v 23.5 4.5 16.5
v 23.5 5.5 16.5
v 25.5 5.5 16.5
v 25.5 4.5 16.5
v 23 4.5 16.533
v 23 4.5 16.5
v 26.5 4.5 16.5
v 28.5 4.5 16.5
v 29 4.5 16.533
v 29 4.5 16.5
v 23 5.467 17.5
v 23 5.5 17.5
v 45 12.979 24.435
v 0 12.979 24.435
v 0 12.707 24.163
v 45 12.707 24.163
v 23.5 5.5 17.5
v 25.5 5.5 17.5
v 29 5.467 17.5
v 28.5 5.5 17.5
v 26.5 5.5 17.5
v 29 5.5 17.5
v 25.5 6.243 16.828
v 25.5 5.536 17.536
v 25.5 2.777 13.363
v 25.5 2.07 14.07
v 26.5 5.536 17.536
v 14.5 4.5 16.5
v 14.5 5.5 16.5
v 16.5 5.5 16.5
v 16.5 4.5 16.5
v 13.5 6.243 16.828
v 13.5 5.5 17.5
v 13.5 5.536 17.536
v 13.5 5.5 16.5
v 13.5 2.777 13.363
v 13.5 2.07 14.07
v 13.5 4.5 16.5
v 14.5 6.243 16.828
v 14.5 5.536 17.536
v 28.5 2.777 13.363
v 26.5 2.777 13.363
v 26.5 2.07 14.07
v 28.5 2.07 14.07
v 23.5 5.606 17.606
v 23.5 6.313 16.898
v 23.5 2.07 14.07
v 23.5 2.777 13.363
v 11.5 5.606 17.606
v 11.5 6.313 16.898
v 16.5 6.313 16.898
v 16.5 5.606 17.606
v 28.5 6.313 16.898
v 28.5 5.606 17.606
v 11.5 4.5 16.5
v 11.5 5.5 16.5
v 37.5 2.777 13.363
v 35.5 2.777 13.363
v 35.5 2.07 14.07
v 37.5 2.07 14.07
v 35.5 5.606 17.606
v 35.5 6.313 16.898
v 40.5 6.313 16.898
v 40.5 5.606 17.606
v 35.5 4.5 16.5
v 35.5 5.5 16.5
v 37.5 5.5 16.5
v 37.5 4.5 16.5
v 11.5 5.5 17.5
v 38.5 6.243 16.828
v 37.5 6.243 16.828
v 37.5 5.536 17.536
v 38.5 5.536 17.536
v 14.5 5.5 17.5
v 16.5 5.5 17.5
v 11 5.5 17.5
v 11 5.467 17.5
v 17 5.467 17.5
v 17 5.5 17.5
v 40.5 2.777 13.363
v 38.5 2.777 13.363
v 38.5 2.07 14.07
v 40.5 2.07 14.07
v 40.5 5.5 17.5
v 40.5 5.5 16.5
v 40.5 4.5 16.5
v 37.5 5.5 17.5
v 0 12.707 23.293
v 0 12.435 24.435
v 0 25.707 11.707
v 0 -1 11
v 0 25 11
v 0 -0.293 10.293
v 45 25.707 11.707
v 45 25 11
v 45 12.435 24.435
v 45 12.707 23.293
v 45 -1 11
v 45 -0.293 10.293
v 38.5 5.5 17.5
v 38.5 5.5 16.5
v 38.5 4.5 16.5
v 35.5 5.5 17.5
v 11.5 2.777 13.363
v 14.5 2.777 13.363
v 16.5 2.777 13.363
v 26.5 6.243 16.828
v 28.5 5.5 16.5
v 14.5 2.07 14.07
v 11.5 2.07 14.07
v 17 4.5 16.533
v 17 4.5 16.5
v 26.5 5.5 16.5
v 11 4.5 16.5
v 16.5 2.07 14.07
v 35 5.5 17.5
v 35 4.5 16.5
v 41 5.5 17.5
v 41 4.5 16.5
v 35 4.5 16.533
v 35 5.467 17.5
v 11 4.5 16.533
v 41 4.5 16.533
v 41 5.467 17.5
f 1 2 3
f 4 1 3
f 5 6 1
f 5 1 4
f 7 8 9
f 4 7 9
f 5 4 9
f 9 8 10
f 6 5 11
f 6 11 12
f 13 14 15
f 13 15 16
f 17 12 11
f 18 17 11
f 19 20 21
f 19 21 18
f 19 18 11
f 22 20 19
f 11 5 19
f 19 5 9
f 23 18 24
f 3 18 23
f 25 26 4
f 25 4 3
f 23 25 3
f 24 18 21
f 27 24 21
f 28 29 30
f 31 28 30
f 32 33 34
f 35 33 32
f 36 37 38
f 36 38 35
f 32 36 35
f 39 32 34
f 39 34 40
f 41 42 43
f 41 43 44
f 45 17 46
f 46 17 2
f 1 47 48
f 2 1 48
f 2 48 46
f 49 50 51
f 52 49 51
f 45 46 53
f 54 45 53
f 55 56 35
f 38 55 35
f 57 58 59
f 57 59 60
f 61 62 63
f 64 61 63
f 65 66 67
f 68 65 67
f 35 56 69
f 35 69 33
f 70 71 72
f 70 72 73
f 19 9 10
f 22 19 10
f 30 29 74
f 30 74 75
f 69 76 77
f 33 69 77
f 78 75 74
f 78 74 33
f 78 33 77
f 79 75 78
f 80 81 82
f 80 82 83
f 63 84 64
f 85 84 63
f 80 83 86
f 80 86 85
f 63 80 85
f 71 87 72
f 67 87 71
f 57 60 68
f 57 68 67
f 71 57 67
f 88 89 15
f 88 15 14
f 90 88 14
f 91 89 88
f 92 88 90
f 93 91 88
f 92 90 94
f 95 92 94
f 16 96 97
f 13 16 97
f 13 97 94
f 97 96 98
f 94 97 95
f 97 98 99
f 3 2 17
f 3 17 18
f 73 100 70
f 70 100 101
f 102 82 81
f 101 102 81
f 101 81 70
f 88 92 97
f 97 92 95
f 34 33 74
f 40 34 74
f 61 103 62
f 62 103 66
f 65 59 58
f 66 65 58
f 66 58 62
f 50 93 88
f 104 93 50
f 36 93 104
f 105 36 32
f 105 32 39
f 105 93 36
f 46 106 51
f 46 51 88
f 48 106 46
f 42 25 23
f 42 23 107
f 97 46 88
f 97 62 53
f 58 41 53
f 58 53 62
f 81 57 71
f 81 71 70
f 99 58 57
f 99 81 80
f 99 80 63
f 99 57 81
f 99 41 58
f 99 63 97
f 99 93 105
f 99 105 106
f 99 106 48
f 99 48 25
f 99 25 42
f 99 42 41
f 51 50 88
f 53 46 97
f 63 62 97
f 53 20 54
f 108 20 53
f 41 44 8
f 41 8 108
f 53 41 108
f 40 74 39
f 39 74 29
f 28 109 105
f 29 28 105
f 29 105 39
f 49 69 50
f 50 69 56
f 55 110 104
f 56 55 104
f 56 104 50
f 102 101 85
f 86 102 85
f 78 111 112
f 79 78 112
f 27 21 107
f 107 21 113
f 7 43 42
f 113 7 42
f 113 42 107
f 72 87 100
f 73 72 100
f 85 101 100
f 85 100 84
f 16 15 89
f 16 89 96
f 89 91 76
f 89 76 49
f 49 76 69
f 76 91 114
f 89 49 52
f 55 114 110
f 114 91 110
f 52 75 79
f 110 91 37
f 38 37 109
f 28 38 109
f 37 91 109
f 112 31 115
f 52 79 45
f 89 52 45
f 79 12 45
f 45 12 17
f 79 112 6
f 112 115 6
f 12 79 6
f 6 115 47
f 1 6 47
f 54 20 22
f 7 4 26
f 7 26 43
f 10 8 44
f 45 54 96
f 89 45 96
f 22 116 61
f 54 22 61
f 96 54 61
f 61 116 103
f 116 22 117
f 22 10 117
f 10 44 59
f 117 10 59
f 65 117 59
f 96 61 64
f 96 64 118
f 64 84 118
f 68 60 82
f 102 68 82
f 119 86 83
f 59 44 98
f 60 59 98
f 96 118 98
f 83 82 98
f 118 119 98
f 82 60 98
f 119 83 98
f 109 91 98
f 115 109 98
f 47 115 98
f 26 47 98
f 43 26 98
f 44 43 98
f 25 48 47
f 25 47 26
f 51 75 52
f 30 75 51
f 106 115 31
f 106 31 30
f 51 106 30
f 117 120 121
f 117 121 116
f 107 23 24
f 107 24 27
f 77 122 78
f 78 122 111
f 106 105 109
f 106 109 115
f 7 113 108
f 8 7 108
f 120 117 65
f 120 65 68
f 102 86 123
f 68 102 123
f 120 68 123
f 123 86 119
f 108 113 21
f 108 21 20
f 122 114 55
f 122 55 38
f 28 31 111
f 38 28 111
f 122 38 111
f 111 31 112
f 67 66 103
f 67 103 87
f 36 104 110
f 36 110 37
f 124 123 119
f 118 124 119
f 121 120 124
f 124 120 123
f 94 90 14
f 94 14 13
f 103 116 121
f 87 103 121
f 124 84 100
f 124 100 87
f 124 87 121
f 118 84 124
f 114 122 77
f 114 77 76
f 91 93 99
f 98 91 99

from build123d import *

# Parameters (mm, degrees)
BOX139_W               = 12
BOX139_H               = 16
BOX139_DEPTH           = 23
BOX139_PLACEMENT_ANGLE = 45
BOX141_W               = 6
BOX141_H               = 1
BOX141_DEPTH           = 1
BOX140_W               = 1
BOX140_H               = 1
BOX140_DEPTH           = 5
BOX140_PLACEMENT_ANGLE = 45
BOX136_W               = 12
BOX136_H               = 16
BOX136_DEPTH           = 23
BOX136_PLACEMENT_ANGLE = 45
BOX137_W               = 6
BOX137_H               = 1
BOX137_DEPTH           = 1
BOX138_W               = 1
BOX138_H               = 1
BOX138_DEPTH           = 5
BOX138_PLACEMENT_ANGLE = 45
BOX130_W               = 5
BOX130_H               = 16
BOX130_DEPTH           = 5
BOX130_PLACEMENT_ANGLE = 45
BOX131_W               = 5
BOX131_H               = 16
BOX131_DEPTH           = 5
BOX131_PLACEMENT_ANGLE = 45
BOX129_W               = 5
BOX129_H               = 16
BOX129_DEPTH           = 5
BOX129_PLACEMENT_ANGLE = 45
BOX034_W               = 45
BOX034_H               = 1
BOX034_DEPTH           = 19
BOX034_PLACEMENT_ANGLE = 45
BOX035_W               = 45
BOX035_H               = 1
BOX035_DEPTH           = 18
BOX035_PLACEMENT_ANGLE = 45
BOX142_W               = 12
BOX142_H               = 16
BOX142_DEPTH           = 23
BOX142_PLACEMENT_ANGLE = 45
BOX144_W               = 6
BOX144_H               = 1
BOX144_DEPTH           = 1
BOX143_W               = 1
BOX143_H               = 1
BOX143_DEPTH           = 5
BOX143_PLACEMENT_ANGLE = 45


with BuildPart() as box139:
    # Box139 → Box139 (new body)
    with BuildSketch(Plane.XY):
        with Locations((6, 8)):
            Rectangle(BOX139_W, BOX139_H)
    extrude(amount=BOX139_DEPTH)


with BuildPart() as box139_1:
    # Box139 placement: moved
    add(box139.part.moved(Location((22, -11.36, 22.5))).rotate(Axis((22, -11.36, 22.5), (-1, 0, 0)), BOX139_PLACEMENT_ANGLE))


with BuildPart() as cut052:
    # Box141 → Box141 (new body)
    with BuildSketch(Plane(origin=(23, 11, 22.2), x_dir=(1, 0, 0), z_dir=(0, 0, 1))):
        with Locations((3, 0.5)):
            Rectangle(BOX141_W, BOX141_H)
    extrude(amount=BOX141_DEPTH)

    # Cut052: cut Box139
    add(box139_1.part, mode=Mode.SUBTRACT)


with BuildPart() as cut052_1:
    # Cut052 placement: moved
    add(cut052.part.moved(Location((-12, -6.5, -5.7))))


with BuildPart() as fusion068:
    # Box140 → Box140 (new body)
    with BuildSketch(Plane.XY):
        with Locations((0.5, 0.5)):
            Rectangle(BOX140_W, BOX140_H)
    extrude(amount=BOX140_DEPTH)


with BuildPart() as fusion068_1:
    # Box140 placement: moved
    add(fusion068.part.moved(Location((13.5, 2, 14))).rotate(Axis((13.5, 2, 14), (-1, 0, 0)), BOX140_PLACEMENT_ANGLE))

    # Fusion068: union Cut052
    add(cut052_1.part)


with BuildPart() as fusion068_2:
    # Fusion068 placement: moved
    add(fusion068_1.part.moved(Location((12, 0, 0))))


with BuildPart() as box136:
    # Box136 → Box136 (new body)
    with BuildSketch(Plane.XY):
        with Locations((6, 8)):
            Rectangle(BOX136_W, BOX136_H)
    extrude(amount=BOX136_DEPTH)


with BuildPart() as box136_1:
    # Box136 placement: moved
    add(box136.part.moved(Location((22, -11.36, 22.5))).rotate(Axis((22, -11.36, 22.5), (-1, 0, 0)), BOX136_PLACEMENT_ANGLE))


with BuildPart() as cut051:
    # Box137 → Box137 (new body)
    with BuildSketch(Plane(origin=(23, 11, 22.2), x_dir=(1, 0, 0), z_dir=(0, 0, 1))):
        with Locations((3, 0.5)):
            Rectangle(BOX137_W, BOX137_H)
    extrude(amount=BOX137_DEPTH)

    # Cut051: cut Box136
    add(box136_1.part, mode=Mode.SUBTRACT)


with BuildPart() as cut051_1:
    # Cut051 placement: moved
    add(cut051.part.moved(Location((-12, -6.5, -5.7))))


with BuildPart() as fusion067:
    # Box138 → Box138 (new body)
    with BuildSketch(Plane.XY):
        with Locations((0.5, 0.5)):
            Rectangle(BOX138_W, BOX138_H)
    extrude(amount=BOX138_DEPTH)


with BuildPart() as fusion067_1:
    # Box138 placement: moved
    add(fusion067.part.moved(Location((13.5, 2, 14))).rotate(Axis((13.5, 2, 14), (-1, 0, 0)), BOX138_PLACEMENT_ANGLE))

    # Fusion067: union Cut051
    add(cut051_1.part)


with BuildPart() as box130:
    # Box130 → Box130 (new body)
    with BuildSketch(Plane.XY):
        with Locations((2.5, 8)):
            Rectangle(BOX130_W, BOX130_H)
    extrude(amount=BOX130_DEPTH)


with BuildPart() as box130_1:
    # Box130 placement: moved
    add(box130.part.moved(Location((35.5, -6.36, 22.5))).rotate(Axis((35.5, -6.36, 22.5), (-1, 0, 0)), BOX130_PLACEMENT_ANGLE))


with BuildPart() as box131:
    # Box131 → Box131 (new body)
    with BuildSketch(Plane.XY):
        with Locations((2.5, 8)):
            Rectangle(BOX131_W, BOX131_H)
    extrude(amount=BOX131_DEPTH)


with BuildPart() as box131_1:
    # Box131 placement: moved
    add(box131.part.moved(Location((11.5, -6.36, 22.5))).rotate(Axis((11.5, -6.36, 22.5), (-1, 0, 0)), BOX131_PLACEMENT_ANGLE))


with BuildPart() as box129:
    # Box129 → Box129 (new body)
    with BuildSketch(Plane.XY):
        with Locations((2.5, 8)):
            Rectangle(BOX129_W, BOX129_H)
    extrude(amount=BOX129_DEPTH)


with BuildPart() as box129_1:
    # Box129 placement: moved
    add(box129.part.moved(Location((23.5, -6.36, 22.5))).rotate(Axis((23.5, -6.36, 22.5), (-1, 0, 0)), BOX129_PLACEMENT_ANGLE))


with BuildPart() as box034:
    # Box034 → Box034 (new body)
    with BuildSketch(Plane.XY):
        with Locations((22.5, 0.5)):
            Rectangle(BOX034_W, BOX034_H)
    extrude(amount=BOX034_DEPTH)


with BuildPart() as box034_1:
    # Box034 placement: moved
    add(box034.part.moved(Location((0, -1, 11))).rotate(Axis((0, -1, 11), (-1, 0, 0)), BOX034_PLACEMENT_ANGLE))


with BuildPart() as cut048:
    # Box035 → Box035 (new body)
    with BuildSketch(Plane.XY):
        with Locations((22.5, 0.5)):
            Rectangle(BOX035_W, BOX035_H)
    extrude(amount=BOX035_DEPTH)


with BuildPart() as cut048_1:
    # Box035 placement: moved
    add(cut048.part.moved(Location((0, 25, 11))).rotate(Axis((0, 25, 11), (1, 0, 0)), BOX035_PLACEMENT_ANGLE))

    # Fusion059: union Box034
    add(box034_1.part)

    # Cut046: cut Box129
    add(box129_1.part, mode=Mode.SUBTRACT)

    # Cut047: cut Box131
    add(box131_1.part, mode=Mode.SUBTRACT)

    # Cut048: cut Box130
    add(box130_1.part, mode=Mode.SUBTRACT)


with BuildPart() as box142:
    # Box142 → Box142 (new body)
    with BuildSketch(Plane.XY):
        with Locations((6, 8)):
            Rectangle(BOX142_W, BOX142_H)
    extrude(amount=BOX142_DEPTH)


with BuildPart() as box142_1:
    # Box142 placement: moved
    add(box142.part.moved(Location((22, -11.36, 22.5))).rotate(Axis((22, -11.36, 22.5), (-1, 0, 0)), BOX142_PLACEMENT_ANGLE))


with BuildPart() as cut053:
    # Box144 → Box144 (new body)
    with BuildSketch(Plane(origin=(23, 11, 22.2), x_dir=(1, 0, 0), z_dir=(0, 0, 1))):
        with Locations((3, 0.5)):
            Rectangle(BOX144_W, BOX144_H)
    extrude(amount=BOX144_DEPTH)

    # Cut053: cut Box142
    add(box142_1.part, mode=Mode.SUBTRACT)


with BuildPart() as cut053_1:
    # Cut053 placement: moved
    add(cut053.part.moved(Location((-12, -6.5, -5.7))))


with BuildPart() as fusion070:
    # Box143 → Box143 (new body)
    with BuildSketch(Plane.XY):
        with Locations((0.5, 0.5)):
            Rectangle(BOX143_W, BOX143_H)
    extrude(amount=BOX143_DEPTH)


with BuildPart() as fusion070_1:
    # Box143 placement: moved
    add(fusion070.part.moved(Location((13.5, 2, 14))).rotate(Axis((13.5, 2, 14), (-1, 0, 0)), BOX143_PLACEMENT_ANGLE))

    # Fusion069: union Cut053
    add(cut053_1.part)


with BuildPart() as fusion070_2:
    # Fusion069 placement: moved
    add(fusion070_1.part.moved(Location((24, 0, 0))))

    # Fusion070: union Fusion068, Fusion067, Cut048
    add(fusion068_2.part)
    add(fusion067_1.part)
    add(cut048_1.part)


solid = fusion070_2.part
